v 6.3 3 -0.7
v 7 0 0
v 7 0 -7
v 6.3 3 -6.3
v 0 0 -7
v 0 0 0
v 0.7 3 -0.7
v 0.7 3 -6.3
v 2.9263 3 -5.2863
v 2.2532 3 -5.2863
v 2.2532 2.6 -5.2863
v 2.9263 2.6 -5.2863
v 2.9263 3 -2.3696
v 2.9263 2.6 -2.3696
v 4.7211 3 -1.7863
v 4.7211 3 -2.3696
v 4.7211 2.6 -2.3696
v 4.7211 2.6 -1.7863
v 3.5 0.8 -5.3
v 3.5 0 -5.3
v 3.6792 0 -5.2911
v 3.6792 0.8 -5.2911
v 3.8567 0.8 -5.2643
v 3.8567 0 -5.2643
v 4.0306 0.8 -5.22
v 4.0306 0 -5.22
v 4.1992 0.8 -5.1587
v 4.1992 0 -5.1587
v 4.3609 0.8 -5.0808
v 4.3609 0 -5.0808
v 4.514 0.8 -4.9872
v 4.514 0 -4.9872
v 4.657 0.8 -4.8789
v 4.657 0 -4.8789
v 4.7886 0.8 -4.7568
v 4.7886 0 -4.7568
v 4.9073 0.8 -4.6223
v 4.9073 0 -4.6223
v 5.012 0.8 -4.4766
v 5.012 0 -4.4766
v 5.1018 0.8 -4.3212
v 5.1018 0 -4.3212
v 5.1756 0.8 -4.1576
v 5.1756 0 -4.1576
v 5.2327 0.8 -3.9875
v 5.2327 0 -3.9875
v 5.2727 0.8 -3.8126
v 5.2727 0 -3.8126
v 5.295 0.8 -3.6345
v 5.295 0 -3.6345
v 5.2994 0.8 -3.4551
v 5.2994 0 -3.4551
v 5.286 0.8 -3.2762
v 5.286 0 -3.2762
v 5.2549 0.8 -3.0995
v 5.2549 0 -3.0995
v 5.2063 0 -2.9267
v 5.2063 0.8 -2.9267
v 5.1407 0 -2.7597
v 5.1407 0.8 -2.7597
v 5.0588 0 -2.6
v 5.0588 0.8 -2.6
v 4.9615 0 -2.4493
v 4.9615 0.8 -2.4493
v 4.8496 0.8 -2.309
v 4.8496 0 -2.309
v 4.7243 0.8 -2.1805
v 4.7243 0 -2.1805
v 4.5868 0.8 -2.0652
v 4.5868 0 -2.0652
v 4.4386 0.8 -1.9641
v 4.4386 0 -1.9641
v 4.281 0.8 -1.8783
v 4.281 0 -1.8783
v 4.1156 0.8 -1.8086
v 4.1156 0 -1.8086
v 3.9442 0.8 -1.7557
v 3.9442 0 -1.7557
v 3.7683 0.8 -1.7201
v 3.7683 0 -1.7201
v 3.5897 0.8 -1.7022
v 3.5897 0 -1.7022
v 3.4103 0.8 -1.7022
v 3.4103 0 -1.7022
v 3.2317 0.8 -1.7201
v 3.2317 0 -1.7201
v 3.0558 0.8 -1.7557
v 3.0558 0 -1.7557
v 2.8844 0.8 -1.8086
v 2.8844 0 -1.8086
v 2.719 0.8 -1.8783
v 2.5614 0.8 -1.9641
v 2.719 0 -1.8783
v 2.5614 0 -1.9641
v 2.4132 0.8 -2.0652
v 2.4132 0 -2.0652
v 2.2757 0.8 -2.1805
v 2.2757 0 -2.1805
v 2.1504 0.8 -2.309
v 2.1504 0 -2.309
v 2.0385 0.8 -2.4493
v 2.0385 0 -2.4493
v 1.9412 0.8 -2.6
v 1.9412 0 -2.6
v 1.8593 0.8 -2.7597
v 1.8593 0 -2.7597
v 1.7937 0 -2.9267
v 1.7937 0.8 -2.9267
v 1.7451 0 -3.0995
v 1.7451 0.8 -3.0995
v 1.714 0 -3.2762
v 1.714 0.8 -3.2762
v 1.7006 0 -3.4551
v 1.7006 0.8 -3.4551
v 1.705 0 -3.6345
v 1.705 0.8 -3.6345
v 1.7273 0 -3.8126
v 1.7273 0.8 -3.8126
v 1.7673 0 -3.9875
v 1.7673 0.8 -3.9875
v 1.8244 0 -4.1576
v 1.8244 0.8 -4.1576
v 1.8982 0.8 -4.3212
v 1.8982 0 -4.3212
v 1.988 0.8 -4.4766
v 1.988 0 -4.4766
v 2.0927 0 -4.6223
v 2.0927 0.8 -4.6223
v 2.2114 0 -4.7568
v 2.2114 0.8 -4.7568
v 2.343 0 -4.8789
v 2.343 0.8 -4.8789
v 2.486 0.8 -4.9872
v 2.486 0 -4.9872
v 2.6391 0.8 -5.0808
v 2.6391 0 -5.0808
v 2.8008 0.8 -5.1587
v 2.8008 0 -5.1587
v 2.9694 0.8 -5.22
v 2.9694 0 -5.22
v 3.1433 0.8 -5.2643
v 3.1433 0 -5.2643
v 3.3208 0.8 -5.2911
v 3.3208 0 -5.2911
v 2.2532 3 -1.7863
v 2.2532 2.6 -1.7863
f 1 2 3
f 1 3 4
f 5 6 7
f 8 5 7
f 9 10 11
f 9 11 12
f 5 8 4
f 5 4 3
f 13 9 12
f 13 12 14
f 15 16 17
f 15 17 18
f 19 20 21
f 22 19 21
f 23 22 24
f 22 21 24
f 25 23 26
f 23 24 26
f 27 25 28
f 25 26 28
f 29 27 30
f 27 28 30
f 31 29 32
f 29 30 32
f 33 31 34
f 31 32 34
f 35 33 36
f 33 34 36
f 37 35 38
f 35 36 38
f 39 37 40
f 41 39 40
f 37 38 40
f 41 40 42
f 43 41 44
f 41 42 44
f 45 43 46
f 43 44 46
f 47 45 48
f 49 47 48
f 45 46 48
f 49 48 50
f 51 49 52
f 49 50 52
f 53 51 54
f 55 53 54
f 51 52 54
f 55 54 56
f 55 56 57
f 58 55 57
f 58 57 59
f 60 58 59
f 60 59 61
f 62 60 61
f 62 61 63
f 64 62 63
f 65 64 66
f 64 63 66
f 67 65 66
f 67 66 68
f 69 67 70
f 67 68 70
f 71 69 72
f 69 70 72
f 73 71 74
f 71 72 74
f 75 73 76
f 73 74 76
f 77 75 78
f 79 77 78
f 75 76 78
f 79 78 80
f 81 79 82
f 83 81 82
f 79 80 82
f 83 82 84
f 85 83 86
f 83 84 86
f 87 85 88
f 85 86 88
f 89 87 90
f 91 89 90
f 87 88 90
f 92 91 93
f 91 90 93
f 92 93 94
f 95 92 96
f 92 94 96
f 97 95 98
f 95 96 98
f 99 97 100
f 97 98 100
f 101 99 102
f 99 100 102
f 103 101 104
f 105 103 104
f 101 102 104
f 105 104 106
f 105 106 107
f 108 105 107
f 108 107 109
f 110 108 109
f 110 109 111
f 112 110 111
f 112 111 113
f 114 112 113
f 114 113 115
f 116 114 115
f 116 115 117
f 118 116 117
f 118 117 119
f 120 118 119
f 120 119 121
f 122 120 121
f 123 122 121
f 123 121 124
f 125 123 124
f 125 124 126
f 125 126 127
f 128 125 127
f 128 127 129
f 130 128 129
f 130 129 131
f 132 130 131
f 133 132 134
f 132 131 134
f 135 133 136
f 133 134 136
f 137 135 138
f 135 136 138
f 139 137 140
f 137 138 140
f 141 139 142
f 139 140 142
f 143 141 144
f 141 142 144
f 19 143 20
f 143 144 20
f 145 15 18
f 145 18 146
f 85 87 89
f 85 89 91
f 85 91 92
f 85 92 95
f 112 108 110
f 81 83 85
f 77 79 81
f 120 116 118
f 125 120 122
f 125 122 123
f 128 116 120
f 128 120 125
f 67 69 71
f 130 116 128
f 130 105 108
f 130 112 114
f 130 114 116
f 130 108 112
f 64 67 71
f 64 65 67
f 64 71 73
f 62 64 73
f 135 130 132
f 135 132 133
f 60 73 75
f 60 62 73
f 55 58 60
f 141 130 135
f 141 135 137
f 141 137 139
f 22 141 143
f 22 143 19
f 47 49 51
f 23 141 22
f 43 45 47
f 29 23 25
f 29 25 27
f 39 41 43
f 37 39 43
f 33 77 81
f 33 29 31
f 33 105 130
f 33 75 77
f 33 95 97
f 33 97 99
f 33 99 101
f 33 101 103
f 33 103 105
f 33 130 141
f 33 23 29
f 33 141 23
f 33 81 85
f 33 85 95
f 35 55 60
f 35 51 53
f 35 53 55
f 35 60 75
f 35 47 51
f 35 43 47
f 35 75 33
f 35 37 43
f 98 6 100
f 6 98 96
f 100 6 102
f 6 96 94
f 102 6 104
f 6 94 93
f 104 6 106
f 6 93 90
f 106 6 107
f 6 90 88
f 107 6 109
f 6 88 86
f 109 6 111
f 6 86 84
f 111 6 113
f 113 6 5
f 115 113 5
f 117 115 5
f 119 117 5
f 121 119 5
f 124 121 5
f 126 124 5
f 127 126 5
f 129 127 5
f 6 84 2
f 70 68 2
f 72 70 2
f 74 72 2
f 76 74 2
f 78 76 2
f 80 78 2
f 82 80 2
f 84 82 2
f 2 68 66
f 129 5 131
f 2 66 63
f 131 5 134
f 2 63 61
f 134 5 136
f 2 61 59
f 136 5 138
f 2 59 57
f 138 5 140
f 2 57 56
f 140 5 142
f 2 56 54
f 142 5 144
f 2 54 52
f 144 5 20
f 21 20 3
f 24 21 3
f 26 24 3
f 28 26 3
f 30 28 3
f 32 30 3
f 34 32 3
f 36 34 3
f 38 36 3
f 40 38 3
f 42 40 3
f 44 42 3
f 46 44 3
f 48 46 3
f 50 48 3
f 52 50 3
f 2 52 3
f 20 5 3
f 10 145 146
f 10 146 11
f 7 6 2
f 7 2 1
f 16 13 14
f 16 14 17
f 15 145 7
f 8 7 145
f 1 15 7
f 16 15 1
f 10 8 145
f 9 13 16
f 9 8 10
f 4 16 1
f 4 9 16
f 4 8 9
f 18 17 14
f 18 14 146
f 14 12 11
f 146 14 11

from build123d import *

# Parameters (mm, degrees)
SKETCH1_W           = 7
SKETCH1_H           = 7
BOSS_EXTRUDE1_DEPTH = 3
CUT_EXTRUDE1_DEPTH  = 7
CUT_EXTRUDE2_DEPTH  = 11
SKETCH4_R           = 1.8
CUT_EXTRUDE3_DEPTH  = 0.8
CUT_EXTRUDE4_DEPTH  = 0.4


with BuildPart() as part:
    # Sketch1 → Boss-Extrude1 (new body)
    with BuildSketch(Plane(origin=(0, 0, 0), x_dir=(1, 0, 0), z_dir=(0, 1, 0))):
        with Locations((3.5, 3.5)):
            Rectangle(SKETCH1_W, SKETCH1_H)
    extrude(amount=BOSS_EXTRUDE1_DEPTH)

    # Sketch2 → Cut-Extrude1 (cut)
    with BuildSketch(Plane.XY):
        Polygon((0, 0), (0.7, 3), (0, 3), align=None)
        Polygon((7, 0), (6.3, 3), (7, 3), align=None)
    extrude(amount=-CUT_EXTRUDE1_DEPTH, mode=Mode.SUBTRACT)

    # Sketch3 → Cut-Extrude2 (cut)
    with BuildSketch(Plane(origin=(0, 0, 0), x_dir=(0, 0, -1), z_dir=(1, 0, 0))):
        Polygon((0, 0), (0.7, 3), (0, 3), align=None)
        Polygon((7, 3), (6.3, 3), (7, 0), align=None)
    extrude(amount=CUT_EXTRUDE2_DEPTH, mode=Mode.SUBTRACT)

    # Sketch4 → Cut-Extrude3 (cut)
    with BuildSketch(Plane.XZ):
        with Locations(Location((3.5, -3.5, 0), (0, 0, 270))):
            Circle(SKETCH4_R)
    extrude(amount=-CUT_EXTRUDE3_DEPTH, mode=Mode.SUBTRACT)

    # Sketch5 → Cut-Extrude4 (cut)
    with BuildSketch(Plane(origin=(0, 3, 0), x_dir=(1, 0, 0), z_dir=(0, 1, 0))):
        Polygon((2.253196063, 1.786270222), (2.253196063, 5.286270222), (2.926272986, 5.286270222), (2.926272986, 2.369603555), (4.721144781, 2.369603555), (4.721144781, 1.786270222), align=None)
    extrude(amount=-CUT_EXTRUDE4_DEPTH, mode=Mode.SUBTRACT)


solid = part.part
